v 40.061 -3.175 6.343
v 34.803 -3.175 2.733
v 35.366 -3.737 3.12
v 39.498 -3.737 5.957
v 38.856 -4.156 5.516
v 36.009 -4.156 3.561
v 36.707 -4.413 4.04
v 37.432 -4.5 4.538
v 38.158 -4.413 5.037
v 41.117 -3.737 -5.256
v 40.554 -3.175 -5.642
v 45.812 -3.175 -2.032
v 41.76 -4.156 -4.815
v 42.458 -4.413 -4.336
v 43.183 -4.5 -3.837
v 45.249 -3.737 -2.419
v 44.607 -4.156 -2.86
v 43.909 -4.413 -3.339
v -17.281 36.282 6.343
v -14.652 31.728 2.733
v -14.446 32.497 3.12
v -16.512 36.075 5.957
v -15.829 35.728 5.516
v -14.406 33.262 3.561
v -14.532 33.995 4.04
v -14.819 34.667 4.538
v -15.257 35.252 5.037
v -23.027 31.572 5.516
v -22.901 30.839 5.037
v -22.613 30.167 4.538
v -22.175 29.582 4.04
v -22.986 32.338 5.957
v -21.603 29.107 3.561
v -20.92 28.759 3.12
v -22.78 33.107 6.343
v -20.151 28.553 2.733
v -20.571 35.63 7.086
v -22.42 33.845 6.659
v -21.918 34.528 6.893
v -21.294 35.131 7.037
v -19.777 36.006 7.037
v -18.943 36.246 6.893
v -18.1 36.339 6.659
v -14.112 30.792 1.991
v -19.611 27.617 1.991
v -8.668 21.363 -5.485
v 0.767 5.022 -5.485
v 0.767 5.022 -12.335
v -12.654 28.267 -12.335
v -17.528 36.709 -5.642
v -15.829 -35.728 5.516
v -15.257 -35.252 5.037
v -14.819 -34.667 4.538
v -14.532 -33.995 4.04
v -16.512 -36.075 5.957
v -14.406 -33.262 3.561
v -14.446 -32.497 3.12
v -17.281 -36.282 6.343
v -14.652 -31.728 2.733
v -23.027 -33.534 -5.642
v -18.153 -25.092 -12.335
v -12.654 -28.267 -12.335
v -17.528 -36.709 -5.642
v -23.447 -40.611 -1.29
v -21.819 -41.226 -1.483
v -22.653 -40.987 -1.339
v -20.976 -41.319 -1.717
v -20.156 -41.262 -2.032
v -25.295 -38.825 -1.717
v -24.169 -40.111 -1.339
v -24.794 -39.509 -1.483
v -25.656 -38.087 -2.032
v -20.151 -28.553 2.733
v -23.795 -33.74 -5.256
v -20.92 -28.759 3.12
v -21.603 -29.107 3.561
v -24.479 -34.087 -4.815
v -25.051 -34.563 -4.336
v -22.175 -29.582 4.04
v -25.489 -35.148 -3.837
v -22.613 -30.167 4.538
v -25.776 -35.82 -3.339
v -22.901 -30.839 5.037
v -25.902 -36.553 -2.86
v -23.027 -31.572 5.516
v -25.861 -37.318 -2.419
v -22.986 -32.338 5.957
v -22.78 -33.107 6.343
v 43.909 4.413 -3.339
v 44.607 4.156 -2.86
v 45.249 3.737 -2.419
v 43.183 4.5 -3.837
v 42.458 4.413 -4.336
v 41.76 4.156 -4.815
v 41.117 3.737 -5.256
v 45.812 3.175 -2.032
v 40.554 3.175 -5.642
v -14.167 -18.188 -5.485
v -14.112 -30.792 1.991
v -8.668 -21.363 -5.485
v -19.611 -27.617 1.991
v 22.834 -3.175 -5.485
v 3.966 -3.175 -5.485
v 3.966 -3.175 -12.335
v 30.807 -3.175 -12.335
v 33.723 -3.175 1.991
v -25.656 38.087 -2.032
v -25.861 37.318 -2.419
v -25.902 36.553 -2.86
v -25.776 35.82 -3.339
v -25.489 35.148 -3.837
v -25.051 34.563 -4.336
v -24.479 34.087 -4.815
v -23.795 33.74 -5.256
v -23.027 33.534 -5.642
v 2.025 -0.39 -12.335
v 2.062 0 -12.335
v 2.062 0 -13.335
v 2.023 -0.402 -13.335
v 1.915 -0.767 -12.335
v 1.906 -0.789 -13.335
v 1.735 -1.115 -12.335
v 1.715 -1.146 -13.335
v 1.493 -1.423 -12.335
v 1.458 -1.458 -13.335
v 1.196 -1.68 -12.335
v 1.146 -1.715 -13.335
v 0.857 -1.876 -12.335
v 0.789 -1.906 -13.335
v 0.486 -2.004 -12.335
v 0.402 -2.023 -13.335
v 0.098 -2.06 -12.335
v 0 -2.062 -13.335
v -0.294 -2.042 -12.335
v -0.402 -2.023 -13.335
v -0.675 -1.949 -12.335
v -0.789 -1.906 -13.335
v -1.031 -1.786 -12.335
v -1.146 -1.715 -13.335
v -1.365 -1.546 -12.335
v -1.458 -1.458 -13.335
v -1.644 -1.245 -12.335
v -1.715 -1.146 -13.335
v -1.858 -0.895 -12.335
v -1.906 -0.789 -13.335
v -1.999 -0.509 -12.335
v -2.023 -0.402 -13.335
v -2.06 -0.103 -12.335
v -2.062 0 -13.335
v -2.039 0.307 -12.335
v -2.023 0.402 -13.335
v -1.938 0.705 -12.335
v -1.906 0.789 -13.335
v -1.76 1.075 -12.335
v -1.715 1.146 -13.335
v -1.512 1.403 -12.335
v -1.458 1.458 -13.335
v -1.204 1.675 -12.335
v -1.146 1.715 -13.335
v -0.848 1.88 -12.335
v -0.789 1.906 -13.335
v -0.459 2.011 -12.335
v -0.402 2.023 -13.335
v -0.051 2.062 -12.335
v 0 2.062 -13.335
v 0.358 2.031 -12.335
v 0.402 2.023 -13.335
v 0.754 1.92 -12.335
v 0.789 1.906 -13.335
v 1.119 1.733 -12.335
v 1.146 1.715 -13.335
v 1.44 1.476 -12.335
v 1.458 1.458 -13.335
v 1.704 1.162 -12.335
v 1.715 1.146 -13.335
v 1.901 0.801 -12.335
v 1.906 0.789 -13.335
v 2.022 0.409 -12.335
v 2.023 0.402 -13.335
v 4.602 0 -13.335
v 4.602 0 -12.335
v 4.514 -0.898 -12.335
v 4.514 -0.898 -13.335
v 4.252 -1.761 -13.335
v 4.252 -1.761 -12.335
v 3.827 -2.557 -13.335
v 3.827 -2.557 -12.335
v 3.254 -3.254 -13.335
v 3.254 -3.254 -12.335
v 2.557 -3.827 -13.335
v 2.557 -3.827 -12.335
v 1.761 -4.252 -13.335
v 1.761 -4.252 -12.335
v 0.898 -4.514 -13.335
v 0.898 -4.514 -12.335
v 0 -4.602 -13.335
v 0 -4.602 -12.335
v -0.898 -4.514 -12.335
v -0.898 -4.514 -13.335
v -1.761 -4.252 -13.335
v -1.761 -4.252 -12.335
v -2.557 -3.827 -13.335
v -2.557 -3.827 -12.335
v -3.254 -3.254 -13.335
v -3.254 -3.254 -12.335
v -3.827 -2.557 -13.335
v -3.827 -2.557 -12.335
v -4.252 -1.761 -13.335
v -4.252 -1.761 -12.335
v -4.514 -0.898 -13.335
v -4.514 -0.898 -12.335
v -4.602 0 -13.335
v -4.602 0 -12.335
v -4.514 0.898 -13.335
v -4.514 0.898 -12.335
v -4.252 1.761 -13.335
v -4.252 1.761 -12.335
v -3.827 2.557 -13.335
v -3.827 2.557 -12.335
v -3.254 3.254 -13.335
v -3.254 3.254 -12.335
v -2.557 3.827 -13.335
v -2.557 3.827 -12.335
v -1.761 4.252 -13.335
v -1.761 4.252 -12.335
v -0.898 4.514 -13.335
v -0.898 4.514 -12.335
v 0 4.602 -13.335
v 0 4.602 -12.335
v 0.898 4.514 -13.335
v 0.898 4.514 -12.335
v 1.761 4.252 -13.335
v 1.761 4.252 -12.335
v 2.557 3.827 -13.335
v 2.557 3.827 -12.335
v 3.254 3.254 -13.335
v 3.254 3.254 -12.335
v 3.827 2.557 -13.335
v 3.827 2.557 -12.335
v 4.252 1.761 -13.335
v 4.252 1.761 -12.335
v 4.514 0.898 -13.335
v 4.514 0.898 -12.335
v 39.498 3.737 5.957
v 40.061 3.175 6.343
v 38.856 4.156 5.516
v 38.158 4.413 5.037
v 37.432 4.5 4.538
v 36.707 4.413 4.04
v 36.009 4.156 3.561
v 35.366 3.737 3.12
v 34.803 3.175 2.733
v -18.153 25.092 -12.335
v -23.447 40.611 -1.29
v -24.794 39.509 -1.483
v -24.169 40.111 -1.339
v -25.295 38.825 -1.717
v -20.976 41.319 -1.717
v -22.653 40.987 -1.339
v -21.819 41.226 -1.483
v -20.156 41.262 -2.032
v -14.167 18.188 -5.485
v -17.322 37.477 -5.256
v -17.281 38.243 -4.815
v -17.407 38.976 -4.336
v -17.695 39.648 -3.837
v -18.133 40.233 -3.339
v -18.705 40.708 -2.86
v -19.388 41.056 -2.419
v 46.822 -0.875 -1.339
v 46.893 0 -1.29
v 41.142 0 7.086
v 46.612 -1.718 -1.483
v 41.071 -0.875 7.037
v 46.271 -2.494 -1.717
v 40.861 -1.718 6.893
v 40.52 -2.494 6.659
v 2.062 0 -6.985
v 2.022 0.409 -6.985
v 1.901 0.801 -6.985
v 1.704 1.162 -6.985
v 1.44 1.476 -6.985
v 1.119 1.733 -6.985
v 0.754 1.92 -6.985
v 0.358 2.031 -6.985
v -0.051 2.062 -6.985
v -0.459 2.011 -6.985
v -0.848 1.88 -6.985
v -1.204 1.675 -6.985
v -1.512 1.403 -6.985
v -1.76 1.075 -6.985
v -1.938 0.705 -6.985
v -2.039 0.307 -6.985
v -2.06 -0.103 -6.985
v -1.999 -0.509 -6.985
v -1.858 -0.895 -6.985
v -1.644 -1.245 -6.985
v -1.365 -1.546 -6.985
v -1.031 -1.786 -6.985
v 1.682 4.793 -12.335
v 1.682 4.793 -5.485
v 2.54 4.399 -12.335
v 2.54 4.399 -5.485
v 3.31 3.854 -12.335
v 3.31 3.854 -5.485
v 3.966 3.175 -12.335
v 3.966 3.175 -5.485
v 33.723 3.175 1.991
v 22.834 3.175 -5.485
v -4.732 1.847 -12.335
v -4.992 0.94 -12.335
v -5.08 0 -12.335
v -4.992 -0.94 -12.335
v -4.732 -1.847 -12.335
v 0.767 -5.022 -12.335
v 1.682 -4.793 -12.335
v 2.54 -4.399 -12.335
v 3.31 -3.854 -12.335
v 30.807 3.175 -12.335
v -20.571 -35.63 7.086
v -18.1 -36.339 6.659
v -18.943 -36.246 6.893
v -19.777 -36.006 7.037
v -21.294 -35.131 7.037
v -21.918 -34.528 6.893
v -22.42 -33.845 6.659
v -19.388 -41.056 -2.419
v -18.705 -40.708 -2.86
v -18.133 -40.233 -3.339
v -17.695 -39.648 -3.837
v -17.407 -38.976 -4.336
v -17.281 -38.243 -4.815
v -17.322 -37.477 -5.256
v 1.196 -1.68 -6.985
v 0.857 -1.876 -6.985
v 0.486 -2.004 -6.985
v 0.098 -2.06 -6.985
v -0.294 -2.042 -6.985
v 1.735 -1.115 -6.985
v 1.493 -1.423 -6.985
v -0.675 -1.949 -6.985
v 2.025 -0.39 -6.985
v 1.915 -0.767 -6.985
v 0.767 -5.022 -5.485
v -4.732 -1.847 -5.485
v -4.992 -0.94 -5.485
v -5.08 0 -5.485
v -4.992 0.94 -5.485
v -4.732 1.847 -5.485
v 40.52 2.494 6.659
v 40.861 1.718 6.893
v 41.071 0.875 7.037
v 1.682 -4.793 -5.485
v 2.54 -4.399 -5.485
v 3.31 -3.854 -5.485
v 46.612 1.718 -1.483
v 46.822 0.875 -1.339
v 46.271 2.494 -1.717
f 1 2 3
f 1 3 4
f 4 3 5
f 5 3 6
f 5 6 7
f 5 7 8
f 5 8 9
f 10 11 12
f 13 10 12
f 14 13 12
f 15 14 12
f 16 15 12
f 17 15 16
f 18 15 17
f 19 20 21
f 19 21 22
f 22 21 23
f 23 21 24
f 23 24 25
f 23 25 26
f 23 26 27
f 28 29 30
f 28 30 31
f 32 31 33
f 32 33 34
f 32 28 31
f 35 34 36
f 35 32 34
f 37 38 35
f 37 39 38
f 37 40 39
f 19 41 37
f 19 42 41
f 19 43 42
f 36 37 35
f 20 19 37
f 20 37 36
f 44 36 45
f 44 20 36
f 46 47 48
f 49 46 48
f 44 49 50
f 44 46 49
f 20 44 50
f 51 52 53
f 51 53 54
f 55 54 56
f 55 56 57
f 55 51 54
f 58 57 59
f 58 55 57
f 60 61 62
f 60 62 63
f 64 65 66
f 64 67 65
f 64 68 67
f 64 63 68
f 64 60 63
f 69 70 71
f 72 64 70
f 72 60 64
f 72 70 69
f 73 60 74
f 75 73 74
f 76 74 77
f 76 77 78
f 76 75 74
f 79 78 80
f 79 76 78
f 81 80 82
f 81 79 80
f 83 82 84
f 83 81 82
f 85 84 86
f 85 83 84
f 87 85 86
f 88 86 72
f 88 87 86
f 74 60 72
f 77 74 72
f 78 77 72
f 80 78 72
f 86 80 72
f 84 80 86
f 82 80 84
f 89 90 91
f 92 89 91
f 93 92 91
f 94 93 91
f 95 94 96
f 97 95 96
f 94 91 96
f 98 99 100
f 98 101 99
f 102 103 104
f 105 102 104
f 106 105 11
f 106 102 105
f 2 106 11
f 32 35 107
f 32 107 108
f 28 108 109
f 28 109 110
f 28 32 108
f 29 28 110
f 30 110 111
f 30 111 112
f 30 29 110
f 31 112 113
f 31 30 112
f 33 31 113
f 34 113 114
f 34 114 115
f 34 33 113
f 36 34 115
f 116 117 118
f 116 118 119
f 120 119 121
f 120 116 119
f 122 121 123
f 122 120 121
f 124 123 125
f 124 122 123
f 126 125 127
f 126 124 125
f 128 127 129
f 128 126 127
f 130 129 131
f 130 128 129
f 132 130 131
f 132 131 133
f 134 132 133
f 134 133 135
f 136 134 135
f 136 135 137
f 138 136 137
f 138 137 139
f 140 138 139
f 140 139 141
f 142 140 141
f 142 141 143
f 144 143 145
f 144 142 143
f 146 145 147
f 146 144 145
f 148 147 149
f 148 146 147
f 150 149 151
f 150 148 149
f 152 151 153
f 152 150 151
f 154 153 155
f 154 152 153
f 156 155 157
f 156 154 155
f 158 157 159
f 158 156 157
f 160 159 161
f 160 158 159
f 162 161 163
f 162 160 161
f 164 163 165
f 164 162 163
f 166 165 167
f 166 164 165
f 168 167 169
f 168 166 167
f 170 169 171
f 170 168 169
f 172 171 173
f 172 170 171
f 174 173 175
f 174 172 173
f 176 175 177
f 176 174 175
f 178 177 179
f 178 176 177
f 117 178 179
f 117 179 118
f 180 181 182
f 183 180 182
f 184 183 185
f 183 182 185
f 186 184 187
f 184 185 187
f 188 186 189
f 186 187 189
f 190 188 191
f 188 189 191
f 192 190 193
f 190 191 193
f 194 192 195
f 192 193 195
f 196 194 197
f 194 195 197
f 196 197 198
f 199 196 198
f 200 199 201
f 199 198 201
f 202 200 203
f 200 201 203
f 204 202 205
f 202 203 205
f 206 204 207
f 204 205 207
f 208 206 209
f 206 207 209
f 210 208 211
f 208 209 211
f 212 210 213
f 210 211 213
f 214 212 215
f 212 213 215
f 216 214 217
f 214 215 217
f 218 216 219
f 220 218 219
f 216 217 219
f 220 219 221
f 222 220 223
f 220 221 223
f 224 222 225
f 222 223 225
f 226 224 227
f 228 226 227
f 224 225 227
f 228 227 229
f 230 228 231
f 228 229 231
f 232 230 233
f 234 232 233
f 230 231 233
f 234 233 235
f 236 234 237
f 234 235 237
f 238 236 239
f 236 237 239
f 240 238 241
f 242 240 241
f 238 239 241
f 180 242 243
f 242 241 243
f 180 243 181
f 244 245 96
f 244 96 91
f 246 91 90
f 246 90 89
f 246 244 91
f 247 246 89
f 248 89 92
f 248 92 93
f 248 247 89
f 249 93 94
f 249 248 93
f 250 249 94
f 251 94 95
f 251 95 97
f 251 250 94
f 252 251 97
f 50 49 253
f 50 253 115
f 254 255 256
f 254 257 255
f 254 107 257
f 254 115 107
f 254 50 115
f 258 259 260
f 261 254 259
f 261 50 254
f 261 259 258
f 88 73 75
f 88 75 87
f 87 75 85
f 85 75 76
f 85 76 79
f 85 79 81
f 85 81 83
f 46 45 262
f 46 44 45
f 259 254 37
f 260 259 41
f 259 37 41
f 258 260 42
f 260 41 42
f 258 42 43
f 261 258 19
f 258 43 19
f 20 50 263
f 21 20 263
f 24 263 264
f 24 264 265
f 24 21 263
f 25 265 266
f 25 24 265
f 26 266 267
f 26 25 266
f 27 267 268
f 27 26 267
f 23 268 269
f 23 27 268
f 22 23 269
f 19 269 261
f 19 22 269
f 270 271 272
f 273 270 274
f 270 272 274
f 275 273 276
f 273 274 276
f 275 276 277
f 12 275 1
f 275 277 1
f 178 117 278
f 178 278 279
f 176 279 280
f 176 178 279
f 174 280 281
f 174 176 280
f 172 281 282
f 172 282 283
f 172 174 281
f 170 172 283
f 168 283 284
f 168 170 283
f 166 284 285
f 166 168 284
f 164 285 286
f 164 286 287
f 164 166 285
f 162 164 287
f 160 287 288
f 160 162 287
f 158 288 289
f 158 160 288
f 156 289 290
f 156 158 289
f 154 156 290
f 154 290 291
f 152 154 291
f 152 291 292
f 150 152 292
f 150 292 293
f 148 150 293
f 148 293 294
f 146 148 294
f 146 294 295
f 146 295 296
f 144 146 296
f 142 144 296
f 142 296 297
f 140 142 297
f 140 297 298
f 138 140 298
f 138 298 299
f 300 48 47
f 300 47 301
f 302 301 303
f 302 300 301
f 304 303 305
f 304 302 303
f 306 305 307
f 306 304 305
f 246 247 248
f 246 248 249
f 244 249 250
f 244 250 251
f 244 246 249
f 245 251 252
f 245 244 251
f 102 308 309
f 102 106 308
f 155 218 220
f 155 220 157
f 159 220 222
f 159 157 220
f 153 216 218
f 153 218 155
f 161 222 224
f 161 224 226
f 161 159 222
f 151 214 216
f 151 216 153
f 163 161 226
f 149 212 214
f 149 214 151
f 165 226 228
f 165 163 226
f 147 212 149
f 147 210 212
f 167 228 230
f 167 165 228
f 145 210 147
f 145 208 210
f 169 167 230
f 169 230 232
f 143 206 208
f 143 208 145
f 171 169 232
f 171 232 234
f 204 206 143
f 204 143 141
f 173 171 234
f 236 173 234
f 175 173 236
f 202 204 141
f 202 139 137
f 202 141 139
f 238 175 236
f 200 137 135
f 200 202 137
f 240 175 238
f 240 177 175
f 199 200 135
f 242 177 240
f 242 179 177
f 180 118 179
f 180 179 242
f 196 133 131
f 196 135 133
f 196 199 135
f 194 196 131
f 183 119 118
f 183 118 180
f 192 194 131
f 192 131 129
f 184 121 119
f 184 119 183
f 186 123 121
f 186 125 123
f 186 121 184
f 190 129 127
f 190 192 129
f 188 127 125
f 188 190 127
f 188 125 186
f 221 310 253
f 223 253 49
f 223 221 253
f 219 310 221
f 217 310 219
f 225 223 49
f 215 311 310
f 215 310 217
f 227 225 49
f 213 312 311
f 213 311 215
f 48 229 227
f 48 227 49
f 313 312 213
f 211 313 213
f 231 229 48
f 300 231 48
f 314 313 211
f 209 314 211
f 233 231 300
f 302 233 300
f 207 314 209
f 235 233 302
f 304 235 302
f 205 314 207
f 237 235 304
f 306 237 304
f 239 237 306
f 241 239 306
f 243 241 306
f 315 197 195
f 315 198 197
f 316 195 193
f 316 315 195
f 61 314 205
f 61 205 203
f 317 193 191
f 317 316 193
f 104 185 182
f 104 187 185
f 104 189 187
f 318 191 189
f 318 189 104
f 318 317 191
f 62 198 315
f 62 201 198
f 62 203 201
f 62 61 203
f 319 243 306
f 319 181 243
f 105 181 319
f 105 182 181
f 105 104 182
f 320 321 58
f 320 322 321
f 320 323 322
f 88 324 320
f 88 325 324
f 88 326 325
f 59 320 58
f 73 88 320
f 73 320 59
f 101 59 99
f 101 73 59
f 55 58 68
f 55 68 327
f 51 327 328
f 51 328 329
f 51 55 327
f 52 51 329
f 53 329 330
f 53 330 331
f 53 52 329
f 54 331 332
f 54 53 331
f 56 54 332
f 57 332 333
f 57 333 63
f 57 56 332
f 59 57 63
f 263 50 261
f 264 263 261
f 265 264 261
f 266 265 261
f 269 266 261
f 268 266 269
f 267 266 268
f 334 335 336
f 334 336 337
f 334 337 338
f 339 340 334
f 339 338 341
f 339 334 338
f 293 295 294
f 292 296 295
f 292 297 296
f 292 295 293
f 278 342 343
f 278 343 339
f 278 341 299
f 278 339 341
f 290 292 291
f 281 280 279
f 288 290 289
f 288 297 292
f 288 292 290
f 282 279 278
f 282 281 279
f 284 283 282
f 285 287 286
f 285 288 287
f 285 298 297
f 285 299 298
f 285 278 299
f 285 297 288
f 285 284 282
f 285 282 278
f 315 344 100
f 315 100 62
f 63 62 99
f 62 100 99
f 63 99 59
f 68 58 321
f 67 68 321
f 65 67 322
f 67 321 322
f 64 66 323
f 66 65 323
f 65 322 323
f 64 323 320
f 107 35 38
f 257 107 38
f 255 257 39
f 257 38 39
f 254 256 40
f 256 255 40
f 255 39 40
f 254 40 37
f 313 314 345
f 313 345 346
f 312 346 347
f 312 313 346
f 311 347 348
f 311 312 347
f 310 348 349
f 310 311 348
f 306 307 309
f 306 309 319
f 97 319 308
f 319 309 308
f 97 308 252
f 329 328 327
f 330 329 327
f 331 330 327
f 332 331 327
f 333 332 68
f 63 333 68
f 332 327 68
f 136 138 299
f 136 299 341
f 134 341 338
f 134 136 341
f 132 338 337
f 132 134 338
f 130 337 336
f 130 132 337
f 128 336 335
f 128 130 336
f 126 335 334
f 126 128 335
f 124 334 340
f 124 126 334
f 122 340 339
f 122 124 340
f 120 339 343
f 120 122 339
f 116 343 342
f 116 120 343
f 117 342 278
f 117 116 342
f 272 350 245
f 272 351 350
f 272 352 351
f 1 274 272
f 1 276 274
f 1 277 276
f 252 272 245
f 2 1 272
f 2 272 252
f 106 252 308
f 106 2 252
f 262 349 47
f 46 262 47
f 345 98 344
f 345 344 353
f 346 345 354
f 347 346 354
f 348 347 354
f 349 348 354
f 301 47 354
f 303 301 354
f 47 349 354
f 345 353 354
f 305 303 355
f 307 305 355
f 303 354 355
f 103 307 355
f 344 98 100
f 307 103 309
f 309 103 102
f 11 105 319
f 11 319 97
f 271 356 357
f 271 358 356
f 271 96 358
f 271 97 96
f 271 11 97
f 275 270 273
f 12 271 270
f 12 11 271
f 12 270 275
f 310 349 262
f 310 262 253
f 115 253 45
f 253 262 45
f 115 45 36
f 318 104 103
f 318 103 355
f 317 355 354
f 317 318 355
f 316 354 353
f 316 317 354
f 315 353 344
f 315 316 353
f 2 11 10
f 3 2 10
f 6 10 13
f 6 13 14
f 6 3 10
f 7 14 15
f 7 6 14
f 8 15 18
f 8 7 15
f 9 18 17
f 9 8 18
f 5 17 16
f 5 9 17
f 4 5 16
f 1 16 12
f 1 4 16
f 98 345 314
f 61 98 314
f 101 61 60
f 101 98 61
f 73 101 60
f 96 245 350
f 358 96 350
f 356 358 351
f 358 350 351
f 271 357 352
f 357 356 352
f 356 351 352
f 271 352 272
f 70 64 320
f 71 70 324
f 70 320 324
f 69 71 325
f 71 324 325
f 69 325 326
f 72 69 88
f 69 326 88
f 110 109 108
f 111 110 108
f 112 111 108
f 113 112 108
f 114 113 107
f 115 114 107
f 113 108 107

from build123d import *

# Parameters (mm, degrees)
F1_DEPTH  = 3.175
F3_DEPTH  = 10.16
F5_DEPTH  = 19.2661186822
F6_COUNT  = 3
F8_DEPTH  = 6.85
F9_R      = 4.6025
F9_R_2    = 2.0625
F10_DEPTH = 1


with BuildPart() as f1:
    # F0 (on Front) → F1 (new body, symmetric)
    with BuildSketch(Plane.XZ):
        Polygon((0, -5.485), (0, -6.985), (2.0625, -6.985), (2.0625, -12.335), (30.8073278059, -12.335), (46.8930374778, -1.2901832047), (41.1420940815, 7.0855107996), (33.7226801014, 1.9911711769), (22.8343583448, -5.485), align=None)
    extrude(amount=F1_DEPTH, both=True)

    # F2 (on face) → F3 (join, through all)
    with BuildSketch(Plane(origin=(9.8755636575, 0, -14.3828053272), x_dir=(0.8243793311, 0, 0.5660377358), z_dir=(-0.5660377358, 0, 0.8243793311))):
        with BuildLine():
            Line((30.23841274, 3.175), (36.6163042411, 3.175))
            ThreePointArc((36.6163042411, 3.175), (33.4273584906, 4.5), (30.23841274, 3.175))
        make_face()
        with BuildLine():
            ThreePointArc((30.23841274, -3.175), (33.4273584906, -4.5), (36.6163042411, -3.175))
            Line((36.6163042411, -3.175), (30.23841274, -3.175))
        make_face()
        with BuildLine():
            ThreePointArc((36.6163042411, -3.175), (37.5867007389, -1.7175191589), (37.9273584906, 0))
            ThreePointArc((37.9273584906, 0), (37.5867007389, 1.7175191589), (36.6163042411, 3.175))
            Line((36.6163042411, 3.175), (30.23841274, 3.175))
            ThreePointArc((30.23841274, 3.175), (28.9273584906, 0), (30.23841274, -3.175))
            Line((30.23841274, -3.175), (36.6163042411, -3.175))
        make_face()
    extrude(amount=-F3_DEPTH)

    # F4 (on face) → F5 (cut, through all)
    with BuildSketch(Plane(origin=(9.8755636575, 0, -14.3828053272), x_dir=(0.8243793311, 0, 0.5660377358), z_dir=(-0.5660377358, 0, 0.8243793311))):
        with BuildLine():
            Line((36.6163042411, -3.175), (37.9273584906, -3.175))
            Line((37.9273584906, -3.175), (37.9273584906, 0))
            ThreePointArc((37.9273584905, 0), (37.5867007389, -1.7175191589), (36.6163042411, -3.175))
        make_face()
        with BuildLine():
            ThreePointArc((36.6163042411, 3.175), (37.5867007389, 1.7175191589), (37.9273584905, 0))
            Line((37.9273584906, 0), (37.9273584906, 3.175))
            Line((37.9273584906, 3.175), (36.6163042411, 3.175))
        make_face()
    extrude(amount=-F5_DEPTH, mode=Mode.SUBTRACT)

    # F6: F1 ×3 about axis
    f6_axis = Axis((0, 0, -2.7425), (0, 0, -1))


with BuildPart() as f1_1:
    add(f1.part)
    for i in range(1, F6_COUNT):
        add(f1.part.rotate(f6_axis, i * 360 / F6_COUNT))

    # F7 (on face) → F8 (join, through all)
    with BuildSketch(Plane(origin=(0, 0, -12.335), x_dir=(1, 0, 0), z_dir=(0, 0, -1))):
        with BuildLine():
            ThreePointArc((-1.031249974, 1.7861774103), (1.031250013, 1.7861773878), (2.0625, 0))
            Line((2.0625, 0), (2.0625, 3.175))
            Line((2.0625, 3.175), (3.965573729, 3.175))
            ThreePointArc((3.965573729, 3.175), (2.54, 4.3994090512), (0.7668437925, 5.0217875899))
            Line((0.7668437925, 5.0217875899), (1.718380657, 3.3736773953))
            Line((1.718380657, 3.3736773953), (-1.031249974, 1.7861774103))
        make_face()
        with BuildLine():
            Line((2.0625, -3.175), (2.0625, 0))
            ThreePointArc((2.0625, 0), (-1.031250013, -1.7861773878), (-1.031249974, 1.7861774103))
            Line((-1.031249974, 1.7861774103), (-3.780880657, 0.1986773953))
            Line((-3.780880657, 0.1986773953), (-4.7324175215, 1.8467875899))
            ThreePointArc((-4.7324175215, 1.8467875899), (-2.54, -4.3994090512), (3.965573729, -3.175))
            Line((3.965573729, -3.175), (2.0625, -3.175))
        make_face()
    extrude(amount=-F8_DEPTH)

    # F9 (on face) → F10 (join)
    with BuildSketch(Plane(origin=(0, 0, -12.335), x_dir=(1, 0, 0), z_dir=(0, 0, -1))):
        Circle(F9_R)
        Circle(F9_R_2, mode=Mode.SUBTRACT)
    extrude(amount=F10_DEPTH)


solid = f1_1.part
